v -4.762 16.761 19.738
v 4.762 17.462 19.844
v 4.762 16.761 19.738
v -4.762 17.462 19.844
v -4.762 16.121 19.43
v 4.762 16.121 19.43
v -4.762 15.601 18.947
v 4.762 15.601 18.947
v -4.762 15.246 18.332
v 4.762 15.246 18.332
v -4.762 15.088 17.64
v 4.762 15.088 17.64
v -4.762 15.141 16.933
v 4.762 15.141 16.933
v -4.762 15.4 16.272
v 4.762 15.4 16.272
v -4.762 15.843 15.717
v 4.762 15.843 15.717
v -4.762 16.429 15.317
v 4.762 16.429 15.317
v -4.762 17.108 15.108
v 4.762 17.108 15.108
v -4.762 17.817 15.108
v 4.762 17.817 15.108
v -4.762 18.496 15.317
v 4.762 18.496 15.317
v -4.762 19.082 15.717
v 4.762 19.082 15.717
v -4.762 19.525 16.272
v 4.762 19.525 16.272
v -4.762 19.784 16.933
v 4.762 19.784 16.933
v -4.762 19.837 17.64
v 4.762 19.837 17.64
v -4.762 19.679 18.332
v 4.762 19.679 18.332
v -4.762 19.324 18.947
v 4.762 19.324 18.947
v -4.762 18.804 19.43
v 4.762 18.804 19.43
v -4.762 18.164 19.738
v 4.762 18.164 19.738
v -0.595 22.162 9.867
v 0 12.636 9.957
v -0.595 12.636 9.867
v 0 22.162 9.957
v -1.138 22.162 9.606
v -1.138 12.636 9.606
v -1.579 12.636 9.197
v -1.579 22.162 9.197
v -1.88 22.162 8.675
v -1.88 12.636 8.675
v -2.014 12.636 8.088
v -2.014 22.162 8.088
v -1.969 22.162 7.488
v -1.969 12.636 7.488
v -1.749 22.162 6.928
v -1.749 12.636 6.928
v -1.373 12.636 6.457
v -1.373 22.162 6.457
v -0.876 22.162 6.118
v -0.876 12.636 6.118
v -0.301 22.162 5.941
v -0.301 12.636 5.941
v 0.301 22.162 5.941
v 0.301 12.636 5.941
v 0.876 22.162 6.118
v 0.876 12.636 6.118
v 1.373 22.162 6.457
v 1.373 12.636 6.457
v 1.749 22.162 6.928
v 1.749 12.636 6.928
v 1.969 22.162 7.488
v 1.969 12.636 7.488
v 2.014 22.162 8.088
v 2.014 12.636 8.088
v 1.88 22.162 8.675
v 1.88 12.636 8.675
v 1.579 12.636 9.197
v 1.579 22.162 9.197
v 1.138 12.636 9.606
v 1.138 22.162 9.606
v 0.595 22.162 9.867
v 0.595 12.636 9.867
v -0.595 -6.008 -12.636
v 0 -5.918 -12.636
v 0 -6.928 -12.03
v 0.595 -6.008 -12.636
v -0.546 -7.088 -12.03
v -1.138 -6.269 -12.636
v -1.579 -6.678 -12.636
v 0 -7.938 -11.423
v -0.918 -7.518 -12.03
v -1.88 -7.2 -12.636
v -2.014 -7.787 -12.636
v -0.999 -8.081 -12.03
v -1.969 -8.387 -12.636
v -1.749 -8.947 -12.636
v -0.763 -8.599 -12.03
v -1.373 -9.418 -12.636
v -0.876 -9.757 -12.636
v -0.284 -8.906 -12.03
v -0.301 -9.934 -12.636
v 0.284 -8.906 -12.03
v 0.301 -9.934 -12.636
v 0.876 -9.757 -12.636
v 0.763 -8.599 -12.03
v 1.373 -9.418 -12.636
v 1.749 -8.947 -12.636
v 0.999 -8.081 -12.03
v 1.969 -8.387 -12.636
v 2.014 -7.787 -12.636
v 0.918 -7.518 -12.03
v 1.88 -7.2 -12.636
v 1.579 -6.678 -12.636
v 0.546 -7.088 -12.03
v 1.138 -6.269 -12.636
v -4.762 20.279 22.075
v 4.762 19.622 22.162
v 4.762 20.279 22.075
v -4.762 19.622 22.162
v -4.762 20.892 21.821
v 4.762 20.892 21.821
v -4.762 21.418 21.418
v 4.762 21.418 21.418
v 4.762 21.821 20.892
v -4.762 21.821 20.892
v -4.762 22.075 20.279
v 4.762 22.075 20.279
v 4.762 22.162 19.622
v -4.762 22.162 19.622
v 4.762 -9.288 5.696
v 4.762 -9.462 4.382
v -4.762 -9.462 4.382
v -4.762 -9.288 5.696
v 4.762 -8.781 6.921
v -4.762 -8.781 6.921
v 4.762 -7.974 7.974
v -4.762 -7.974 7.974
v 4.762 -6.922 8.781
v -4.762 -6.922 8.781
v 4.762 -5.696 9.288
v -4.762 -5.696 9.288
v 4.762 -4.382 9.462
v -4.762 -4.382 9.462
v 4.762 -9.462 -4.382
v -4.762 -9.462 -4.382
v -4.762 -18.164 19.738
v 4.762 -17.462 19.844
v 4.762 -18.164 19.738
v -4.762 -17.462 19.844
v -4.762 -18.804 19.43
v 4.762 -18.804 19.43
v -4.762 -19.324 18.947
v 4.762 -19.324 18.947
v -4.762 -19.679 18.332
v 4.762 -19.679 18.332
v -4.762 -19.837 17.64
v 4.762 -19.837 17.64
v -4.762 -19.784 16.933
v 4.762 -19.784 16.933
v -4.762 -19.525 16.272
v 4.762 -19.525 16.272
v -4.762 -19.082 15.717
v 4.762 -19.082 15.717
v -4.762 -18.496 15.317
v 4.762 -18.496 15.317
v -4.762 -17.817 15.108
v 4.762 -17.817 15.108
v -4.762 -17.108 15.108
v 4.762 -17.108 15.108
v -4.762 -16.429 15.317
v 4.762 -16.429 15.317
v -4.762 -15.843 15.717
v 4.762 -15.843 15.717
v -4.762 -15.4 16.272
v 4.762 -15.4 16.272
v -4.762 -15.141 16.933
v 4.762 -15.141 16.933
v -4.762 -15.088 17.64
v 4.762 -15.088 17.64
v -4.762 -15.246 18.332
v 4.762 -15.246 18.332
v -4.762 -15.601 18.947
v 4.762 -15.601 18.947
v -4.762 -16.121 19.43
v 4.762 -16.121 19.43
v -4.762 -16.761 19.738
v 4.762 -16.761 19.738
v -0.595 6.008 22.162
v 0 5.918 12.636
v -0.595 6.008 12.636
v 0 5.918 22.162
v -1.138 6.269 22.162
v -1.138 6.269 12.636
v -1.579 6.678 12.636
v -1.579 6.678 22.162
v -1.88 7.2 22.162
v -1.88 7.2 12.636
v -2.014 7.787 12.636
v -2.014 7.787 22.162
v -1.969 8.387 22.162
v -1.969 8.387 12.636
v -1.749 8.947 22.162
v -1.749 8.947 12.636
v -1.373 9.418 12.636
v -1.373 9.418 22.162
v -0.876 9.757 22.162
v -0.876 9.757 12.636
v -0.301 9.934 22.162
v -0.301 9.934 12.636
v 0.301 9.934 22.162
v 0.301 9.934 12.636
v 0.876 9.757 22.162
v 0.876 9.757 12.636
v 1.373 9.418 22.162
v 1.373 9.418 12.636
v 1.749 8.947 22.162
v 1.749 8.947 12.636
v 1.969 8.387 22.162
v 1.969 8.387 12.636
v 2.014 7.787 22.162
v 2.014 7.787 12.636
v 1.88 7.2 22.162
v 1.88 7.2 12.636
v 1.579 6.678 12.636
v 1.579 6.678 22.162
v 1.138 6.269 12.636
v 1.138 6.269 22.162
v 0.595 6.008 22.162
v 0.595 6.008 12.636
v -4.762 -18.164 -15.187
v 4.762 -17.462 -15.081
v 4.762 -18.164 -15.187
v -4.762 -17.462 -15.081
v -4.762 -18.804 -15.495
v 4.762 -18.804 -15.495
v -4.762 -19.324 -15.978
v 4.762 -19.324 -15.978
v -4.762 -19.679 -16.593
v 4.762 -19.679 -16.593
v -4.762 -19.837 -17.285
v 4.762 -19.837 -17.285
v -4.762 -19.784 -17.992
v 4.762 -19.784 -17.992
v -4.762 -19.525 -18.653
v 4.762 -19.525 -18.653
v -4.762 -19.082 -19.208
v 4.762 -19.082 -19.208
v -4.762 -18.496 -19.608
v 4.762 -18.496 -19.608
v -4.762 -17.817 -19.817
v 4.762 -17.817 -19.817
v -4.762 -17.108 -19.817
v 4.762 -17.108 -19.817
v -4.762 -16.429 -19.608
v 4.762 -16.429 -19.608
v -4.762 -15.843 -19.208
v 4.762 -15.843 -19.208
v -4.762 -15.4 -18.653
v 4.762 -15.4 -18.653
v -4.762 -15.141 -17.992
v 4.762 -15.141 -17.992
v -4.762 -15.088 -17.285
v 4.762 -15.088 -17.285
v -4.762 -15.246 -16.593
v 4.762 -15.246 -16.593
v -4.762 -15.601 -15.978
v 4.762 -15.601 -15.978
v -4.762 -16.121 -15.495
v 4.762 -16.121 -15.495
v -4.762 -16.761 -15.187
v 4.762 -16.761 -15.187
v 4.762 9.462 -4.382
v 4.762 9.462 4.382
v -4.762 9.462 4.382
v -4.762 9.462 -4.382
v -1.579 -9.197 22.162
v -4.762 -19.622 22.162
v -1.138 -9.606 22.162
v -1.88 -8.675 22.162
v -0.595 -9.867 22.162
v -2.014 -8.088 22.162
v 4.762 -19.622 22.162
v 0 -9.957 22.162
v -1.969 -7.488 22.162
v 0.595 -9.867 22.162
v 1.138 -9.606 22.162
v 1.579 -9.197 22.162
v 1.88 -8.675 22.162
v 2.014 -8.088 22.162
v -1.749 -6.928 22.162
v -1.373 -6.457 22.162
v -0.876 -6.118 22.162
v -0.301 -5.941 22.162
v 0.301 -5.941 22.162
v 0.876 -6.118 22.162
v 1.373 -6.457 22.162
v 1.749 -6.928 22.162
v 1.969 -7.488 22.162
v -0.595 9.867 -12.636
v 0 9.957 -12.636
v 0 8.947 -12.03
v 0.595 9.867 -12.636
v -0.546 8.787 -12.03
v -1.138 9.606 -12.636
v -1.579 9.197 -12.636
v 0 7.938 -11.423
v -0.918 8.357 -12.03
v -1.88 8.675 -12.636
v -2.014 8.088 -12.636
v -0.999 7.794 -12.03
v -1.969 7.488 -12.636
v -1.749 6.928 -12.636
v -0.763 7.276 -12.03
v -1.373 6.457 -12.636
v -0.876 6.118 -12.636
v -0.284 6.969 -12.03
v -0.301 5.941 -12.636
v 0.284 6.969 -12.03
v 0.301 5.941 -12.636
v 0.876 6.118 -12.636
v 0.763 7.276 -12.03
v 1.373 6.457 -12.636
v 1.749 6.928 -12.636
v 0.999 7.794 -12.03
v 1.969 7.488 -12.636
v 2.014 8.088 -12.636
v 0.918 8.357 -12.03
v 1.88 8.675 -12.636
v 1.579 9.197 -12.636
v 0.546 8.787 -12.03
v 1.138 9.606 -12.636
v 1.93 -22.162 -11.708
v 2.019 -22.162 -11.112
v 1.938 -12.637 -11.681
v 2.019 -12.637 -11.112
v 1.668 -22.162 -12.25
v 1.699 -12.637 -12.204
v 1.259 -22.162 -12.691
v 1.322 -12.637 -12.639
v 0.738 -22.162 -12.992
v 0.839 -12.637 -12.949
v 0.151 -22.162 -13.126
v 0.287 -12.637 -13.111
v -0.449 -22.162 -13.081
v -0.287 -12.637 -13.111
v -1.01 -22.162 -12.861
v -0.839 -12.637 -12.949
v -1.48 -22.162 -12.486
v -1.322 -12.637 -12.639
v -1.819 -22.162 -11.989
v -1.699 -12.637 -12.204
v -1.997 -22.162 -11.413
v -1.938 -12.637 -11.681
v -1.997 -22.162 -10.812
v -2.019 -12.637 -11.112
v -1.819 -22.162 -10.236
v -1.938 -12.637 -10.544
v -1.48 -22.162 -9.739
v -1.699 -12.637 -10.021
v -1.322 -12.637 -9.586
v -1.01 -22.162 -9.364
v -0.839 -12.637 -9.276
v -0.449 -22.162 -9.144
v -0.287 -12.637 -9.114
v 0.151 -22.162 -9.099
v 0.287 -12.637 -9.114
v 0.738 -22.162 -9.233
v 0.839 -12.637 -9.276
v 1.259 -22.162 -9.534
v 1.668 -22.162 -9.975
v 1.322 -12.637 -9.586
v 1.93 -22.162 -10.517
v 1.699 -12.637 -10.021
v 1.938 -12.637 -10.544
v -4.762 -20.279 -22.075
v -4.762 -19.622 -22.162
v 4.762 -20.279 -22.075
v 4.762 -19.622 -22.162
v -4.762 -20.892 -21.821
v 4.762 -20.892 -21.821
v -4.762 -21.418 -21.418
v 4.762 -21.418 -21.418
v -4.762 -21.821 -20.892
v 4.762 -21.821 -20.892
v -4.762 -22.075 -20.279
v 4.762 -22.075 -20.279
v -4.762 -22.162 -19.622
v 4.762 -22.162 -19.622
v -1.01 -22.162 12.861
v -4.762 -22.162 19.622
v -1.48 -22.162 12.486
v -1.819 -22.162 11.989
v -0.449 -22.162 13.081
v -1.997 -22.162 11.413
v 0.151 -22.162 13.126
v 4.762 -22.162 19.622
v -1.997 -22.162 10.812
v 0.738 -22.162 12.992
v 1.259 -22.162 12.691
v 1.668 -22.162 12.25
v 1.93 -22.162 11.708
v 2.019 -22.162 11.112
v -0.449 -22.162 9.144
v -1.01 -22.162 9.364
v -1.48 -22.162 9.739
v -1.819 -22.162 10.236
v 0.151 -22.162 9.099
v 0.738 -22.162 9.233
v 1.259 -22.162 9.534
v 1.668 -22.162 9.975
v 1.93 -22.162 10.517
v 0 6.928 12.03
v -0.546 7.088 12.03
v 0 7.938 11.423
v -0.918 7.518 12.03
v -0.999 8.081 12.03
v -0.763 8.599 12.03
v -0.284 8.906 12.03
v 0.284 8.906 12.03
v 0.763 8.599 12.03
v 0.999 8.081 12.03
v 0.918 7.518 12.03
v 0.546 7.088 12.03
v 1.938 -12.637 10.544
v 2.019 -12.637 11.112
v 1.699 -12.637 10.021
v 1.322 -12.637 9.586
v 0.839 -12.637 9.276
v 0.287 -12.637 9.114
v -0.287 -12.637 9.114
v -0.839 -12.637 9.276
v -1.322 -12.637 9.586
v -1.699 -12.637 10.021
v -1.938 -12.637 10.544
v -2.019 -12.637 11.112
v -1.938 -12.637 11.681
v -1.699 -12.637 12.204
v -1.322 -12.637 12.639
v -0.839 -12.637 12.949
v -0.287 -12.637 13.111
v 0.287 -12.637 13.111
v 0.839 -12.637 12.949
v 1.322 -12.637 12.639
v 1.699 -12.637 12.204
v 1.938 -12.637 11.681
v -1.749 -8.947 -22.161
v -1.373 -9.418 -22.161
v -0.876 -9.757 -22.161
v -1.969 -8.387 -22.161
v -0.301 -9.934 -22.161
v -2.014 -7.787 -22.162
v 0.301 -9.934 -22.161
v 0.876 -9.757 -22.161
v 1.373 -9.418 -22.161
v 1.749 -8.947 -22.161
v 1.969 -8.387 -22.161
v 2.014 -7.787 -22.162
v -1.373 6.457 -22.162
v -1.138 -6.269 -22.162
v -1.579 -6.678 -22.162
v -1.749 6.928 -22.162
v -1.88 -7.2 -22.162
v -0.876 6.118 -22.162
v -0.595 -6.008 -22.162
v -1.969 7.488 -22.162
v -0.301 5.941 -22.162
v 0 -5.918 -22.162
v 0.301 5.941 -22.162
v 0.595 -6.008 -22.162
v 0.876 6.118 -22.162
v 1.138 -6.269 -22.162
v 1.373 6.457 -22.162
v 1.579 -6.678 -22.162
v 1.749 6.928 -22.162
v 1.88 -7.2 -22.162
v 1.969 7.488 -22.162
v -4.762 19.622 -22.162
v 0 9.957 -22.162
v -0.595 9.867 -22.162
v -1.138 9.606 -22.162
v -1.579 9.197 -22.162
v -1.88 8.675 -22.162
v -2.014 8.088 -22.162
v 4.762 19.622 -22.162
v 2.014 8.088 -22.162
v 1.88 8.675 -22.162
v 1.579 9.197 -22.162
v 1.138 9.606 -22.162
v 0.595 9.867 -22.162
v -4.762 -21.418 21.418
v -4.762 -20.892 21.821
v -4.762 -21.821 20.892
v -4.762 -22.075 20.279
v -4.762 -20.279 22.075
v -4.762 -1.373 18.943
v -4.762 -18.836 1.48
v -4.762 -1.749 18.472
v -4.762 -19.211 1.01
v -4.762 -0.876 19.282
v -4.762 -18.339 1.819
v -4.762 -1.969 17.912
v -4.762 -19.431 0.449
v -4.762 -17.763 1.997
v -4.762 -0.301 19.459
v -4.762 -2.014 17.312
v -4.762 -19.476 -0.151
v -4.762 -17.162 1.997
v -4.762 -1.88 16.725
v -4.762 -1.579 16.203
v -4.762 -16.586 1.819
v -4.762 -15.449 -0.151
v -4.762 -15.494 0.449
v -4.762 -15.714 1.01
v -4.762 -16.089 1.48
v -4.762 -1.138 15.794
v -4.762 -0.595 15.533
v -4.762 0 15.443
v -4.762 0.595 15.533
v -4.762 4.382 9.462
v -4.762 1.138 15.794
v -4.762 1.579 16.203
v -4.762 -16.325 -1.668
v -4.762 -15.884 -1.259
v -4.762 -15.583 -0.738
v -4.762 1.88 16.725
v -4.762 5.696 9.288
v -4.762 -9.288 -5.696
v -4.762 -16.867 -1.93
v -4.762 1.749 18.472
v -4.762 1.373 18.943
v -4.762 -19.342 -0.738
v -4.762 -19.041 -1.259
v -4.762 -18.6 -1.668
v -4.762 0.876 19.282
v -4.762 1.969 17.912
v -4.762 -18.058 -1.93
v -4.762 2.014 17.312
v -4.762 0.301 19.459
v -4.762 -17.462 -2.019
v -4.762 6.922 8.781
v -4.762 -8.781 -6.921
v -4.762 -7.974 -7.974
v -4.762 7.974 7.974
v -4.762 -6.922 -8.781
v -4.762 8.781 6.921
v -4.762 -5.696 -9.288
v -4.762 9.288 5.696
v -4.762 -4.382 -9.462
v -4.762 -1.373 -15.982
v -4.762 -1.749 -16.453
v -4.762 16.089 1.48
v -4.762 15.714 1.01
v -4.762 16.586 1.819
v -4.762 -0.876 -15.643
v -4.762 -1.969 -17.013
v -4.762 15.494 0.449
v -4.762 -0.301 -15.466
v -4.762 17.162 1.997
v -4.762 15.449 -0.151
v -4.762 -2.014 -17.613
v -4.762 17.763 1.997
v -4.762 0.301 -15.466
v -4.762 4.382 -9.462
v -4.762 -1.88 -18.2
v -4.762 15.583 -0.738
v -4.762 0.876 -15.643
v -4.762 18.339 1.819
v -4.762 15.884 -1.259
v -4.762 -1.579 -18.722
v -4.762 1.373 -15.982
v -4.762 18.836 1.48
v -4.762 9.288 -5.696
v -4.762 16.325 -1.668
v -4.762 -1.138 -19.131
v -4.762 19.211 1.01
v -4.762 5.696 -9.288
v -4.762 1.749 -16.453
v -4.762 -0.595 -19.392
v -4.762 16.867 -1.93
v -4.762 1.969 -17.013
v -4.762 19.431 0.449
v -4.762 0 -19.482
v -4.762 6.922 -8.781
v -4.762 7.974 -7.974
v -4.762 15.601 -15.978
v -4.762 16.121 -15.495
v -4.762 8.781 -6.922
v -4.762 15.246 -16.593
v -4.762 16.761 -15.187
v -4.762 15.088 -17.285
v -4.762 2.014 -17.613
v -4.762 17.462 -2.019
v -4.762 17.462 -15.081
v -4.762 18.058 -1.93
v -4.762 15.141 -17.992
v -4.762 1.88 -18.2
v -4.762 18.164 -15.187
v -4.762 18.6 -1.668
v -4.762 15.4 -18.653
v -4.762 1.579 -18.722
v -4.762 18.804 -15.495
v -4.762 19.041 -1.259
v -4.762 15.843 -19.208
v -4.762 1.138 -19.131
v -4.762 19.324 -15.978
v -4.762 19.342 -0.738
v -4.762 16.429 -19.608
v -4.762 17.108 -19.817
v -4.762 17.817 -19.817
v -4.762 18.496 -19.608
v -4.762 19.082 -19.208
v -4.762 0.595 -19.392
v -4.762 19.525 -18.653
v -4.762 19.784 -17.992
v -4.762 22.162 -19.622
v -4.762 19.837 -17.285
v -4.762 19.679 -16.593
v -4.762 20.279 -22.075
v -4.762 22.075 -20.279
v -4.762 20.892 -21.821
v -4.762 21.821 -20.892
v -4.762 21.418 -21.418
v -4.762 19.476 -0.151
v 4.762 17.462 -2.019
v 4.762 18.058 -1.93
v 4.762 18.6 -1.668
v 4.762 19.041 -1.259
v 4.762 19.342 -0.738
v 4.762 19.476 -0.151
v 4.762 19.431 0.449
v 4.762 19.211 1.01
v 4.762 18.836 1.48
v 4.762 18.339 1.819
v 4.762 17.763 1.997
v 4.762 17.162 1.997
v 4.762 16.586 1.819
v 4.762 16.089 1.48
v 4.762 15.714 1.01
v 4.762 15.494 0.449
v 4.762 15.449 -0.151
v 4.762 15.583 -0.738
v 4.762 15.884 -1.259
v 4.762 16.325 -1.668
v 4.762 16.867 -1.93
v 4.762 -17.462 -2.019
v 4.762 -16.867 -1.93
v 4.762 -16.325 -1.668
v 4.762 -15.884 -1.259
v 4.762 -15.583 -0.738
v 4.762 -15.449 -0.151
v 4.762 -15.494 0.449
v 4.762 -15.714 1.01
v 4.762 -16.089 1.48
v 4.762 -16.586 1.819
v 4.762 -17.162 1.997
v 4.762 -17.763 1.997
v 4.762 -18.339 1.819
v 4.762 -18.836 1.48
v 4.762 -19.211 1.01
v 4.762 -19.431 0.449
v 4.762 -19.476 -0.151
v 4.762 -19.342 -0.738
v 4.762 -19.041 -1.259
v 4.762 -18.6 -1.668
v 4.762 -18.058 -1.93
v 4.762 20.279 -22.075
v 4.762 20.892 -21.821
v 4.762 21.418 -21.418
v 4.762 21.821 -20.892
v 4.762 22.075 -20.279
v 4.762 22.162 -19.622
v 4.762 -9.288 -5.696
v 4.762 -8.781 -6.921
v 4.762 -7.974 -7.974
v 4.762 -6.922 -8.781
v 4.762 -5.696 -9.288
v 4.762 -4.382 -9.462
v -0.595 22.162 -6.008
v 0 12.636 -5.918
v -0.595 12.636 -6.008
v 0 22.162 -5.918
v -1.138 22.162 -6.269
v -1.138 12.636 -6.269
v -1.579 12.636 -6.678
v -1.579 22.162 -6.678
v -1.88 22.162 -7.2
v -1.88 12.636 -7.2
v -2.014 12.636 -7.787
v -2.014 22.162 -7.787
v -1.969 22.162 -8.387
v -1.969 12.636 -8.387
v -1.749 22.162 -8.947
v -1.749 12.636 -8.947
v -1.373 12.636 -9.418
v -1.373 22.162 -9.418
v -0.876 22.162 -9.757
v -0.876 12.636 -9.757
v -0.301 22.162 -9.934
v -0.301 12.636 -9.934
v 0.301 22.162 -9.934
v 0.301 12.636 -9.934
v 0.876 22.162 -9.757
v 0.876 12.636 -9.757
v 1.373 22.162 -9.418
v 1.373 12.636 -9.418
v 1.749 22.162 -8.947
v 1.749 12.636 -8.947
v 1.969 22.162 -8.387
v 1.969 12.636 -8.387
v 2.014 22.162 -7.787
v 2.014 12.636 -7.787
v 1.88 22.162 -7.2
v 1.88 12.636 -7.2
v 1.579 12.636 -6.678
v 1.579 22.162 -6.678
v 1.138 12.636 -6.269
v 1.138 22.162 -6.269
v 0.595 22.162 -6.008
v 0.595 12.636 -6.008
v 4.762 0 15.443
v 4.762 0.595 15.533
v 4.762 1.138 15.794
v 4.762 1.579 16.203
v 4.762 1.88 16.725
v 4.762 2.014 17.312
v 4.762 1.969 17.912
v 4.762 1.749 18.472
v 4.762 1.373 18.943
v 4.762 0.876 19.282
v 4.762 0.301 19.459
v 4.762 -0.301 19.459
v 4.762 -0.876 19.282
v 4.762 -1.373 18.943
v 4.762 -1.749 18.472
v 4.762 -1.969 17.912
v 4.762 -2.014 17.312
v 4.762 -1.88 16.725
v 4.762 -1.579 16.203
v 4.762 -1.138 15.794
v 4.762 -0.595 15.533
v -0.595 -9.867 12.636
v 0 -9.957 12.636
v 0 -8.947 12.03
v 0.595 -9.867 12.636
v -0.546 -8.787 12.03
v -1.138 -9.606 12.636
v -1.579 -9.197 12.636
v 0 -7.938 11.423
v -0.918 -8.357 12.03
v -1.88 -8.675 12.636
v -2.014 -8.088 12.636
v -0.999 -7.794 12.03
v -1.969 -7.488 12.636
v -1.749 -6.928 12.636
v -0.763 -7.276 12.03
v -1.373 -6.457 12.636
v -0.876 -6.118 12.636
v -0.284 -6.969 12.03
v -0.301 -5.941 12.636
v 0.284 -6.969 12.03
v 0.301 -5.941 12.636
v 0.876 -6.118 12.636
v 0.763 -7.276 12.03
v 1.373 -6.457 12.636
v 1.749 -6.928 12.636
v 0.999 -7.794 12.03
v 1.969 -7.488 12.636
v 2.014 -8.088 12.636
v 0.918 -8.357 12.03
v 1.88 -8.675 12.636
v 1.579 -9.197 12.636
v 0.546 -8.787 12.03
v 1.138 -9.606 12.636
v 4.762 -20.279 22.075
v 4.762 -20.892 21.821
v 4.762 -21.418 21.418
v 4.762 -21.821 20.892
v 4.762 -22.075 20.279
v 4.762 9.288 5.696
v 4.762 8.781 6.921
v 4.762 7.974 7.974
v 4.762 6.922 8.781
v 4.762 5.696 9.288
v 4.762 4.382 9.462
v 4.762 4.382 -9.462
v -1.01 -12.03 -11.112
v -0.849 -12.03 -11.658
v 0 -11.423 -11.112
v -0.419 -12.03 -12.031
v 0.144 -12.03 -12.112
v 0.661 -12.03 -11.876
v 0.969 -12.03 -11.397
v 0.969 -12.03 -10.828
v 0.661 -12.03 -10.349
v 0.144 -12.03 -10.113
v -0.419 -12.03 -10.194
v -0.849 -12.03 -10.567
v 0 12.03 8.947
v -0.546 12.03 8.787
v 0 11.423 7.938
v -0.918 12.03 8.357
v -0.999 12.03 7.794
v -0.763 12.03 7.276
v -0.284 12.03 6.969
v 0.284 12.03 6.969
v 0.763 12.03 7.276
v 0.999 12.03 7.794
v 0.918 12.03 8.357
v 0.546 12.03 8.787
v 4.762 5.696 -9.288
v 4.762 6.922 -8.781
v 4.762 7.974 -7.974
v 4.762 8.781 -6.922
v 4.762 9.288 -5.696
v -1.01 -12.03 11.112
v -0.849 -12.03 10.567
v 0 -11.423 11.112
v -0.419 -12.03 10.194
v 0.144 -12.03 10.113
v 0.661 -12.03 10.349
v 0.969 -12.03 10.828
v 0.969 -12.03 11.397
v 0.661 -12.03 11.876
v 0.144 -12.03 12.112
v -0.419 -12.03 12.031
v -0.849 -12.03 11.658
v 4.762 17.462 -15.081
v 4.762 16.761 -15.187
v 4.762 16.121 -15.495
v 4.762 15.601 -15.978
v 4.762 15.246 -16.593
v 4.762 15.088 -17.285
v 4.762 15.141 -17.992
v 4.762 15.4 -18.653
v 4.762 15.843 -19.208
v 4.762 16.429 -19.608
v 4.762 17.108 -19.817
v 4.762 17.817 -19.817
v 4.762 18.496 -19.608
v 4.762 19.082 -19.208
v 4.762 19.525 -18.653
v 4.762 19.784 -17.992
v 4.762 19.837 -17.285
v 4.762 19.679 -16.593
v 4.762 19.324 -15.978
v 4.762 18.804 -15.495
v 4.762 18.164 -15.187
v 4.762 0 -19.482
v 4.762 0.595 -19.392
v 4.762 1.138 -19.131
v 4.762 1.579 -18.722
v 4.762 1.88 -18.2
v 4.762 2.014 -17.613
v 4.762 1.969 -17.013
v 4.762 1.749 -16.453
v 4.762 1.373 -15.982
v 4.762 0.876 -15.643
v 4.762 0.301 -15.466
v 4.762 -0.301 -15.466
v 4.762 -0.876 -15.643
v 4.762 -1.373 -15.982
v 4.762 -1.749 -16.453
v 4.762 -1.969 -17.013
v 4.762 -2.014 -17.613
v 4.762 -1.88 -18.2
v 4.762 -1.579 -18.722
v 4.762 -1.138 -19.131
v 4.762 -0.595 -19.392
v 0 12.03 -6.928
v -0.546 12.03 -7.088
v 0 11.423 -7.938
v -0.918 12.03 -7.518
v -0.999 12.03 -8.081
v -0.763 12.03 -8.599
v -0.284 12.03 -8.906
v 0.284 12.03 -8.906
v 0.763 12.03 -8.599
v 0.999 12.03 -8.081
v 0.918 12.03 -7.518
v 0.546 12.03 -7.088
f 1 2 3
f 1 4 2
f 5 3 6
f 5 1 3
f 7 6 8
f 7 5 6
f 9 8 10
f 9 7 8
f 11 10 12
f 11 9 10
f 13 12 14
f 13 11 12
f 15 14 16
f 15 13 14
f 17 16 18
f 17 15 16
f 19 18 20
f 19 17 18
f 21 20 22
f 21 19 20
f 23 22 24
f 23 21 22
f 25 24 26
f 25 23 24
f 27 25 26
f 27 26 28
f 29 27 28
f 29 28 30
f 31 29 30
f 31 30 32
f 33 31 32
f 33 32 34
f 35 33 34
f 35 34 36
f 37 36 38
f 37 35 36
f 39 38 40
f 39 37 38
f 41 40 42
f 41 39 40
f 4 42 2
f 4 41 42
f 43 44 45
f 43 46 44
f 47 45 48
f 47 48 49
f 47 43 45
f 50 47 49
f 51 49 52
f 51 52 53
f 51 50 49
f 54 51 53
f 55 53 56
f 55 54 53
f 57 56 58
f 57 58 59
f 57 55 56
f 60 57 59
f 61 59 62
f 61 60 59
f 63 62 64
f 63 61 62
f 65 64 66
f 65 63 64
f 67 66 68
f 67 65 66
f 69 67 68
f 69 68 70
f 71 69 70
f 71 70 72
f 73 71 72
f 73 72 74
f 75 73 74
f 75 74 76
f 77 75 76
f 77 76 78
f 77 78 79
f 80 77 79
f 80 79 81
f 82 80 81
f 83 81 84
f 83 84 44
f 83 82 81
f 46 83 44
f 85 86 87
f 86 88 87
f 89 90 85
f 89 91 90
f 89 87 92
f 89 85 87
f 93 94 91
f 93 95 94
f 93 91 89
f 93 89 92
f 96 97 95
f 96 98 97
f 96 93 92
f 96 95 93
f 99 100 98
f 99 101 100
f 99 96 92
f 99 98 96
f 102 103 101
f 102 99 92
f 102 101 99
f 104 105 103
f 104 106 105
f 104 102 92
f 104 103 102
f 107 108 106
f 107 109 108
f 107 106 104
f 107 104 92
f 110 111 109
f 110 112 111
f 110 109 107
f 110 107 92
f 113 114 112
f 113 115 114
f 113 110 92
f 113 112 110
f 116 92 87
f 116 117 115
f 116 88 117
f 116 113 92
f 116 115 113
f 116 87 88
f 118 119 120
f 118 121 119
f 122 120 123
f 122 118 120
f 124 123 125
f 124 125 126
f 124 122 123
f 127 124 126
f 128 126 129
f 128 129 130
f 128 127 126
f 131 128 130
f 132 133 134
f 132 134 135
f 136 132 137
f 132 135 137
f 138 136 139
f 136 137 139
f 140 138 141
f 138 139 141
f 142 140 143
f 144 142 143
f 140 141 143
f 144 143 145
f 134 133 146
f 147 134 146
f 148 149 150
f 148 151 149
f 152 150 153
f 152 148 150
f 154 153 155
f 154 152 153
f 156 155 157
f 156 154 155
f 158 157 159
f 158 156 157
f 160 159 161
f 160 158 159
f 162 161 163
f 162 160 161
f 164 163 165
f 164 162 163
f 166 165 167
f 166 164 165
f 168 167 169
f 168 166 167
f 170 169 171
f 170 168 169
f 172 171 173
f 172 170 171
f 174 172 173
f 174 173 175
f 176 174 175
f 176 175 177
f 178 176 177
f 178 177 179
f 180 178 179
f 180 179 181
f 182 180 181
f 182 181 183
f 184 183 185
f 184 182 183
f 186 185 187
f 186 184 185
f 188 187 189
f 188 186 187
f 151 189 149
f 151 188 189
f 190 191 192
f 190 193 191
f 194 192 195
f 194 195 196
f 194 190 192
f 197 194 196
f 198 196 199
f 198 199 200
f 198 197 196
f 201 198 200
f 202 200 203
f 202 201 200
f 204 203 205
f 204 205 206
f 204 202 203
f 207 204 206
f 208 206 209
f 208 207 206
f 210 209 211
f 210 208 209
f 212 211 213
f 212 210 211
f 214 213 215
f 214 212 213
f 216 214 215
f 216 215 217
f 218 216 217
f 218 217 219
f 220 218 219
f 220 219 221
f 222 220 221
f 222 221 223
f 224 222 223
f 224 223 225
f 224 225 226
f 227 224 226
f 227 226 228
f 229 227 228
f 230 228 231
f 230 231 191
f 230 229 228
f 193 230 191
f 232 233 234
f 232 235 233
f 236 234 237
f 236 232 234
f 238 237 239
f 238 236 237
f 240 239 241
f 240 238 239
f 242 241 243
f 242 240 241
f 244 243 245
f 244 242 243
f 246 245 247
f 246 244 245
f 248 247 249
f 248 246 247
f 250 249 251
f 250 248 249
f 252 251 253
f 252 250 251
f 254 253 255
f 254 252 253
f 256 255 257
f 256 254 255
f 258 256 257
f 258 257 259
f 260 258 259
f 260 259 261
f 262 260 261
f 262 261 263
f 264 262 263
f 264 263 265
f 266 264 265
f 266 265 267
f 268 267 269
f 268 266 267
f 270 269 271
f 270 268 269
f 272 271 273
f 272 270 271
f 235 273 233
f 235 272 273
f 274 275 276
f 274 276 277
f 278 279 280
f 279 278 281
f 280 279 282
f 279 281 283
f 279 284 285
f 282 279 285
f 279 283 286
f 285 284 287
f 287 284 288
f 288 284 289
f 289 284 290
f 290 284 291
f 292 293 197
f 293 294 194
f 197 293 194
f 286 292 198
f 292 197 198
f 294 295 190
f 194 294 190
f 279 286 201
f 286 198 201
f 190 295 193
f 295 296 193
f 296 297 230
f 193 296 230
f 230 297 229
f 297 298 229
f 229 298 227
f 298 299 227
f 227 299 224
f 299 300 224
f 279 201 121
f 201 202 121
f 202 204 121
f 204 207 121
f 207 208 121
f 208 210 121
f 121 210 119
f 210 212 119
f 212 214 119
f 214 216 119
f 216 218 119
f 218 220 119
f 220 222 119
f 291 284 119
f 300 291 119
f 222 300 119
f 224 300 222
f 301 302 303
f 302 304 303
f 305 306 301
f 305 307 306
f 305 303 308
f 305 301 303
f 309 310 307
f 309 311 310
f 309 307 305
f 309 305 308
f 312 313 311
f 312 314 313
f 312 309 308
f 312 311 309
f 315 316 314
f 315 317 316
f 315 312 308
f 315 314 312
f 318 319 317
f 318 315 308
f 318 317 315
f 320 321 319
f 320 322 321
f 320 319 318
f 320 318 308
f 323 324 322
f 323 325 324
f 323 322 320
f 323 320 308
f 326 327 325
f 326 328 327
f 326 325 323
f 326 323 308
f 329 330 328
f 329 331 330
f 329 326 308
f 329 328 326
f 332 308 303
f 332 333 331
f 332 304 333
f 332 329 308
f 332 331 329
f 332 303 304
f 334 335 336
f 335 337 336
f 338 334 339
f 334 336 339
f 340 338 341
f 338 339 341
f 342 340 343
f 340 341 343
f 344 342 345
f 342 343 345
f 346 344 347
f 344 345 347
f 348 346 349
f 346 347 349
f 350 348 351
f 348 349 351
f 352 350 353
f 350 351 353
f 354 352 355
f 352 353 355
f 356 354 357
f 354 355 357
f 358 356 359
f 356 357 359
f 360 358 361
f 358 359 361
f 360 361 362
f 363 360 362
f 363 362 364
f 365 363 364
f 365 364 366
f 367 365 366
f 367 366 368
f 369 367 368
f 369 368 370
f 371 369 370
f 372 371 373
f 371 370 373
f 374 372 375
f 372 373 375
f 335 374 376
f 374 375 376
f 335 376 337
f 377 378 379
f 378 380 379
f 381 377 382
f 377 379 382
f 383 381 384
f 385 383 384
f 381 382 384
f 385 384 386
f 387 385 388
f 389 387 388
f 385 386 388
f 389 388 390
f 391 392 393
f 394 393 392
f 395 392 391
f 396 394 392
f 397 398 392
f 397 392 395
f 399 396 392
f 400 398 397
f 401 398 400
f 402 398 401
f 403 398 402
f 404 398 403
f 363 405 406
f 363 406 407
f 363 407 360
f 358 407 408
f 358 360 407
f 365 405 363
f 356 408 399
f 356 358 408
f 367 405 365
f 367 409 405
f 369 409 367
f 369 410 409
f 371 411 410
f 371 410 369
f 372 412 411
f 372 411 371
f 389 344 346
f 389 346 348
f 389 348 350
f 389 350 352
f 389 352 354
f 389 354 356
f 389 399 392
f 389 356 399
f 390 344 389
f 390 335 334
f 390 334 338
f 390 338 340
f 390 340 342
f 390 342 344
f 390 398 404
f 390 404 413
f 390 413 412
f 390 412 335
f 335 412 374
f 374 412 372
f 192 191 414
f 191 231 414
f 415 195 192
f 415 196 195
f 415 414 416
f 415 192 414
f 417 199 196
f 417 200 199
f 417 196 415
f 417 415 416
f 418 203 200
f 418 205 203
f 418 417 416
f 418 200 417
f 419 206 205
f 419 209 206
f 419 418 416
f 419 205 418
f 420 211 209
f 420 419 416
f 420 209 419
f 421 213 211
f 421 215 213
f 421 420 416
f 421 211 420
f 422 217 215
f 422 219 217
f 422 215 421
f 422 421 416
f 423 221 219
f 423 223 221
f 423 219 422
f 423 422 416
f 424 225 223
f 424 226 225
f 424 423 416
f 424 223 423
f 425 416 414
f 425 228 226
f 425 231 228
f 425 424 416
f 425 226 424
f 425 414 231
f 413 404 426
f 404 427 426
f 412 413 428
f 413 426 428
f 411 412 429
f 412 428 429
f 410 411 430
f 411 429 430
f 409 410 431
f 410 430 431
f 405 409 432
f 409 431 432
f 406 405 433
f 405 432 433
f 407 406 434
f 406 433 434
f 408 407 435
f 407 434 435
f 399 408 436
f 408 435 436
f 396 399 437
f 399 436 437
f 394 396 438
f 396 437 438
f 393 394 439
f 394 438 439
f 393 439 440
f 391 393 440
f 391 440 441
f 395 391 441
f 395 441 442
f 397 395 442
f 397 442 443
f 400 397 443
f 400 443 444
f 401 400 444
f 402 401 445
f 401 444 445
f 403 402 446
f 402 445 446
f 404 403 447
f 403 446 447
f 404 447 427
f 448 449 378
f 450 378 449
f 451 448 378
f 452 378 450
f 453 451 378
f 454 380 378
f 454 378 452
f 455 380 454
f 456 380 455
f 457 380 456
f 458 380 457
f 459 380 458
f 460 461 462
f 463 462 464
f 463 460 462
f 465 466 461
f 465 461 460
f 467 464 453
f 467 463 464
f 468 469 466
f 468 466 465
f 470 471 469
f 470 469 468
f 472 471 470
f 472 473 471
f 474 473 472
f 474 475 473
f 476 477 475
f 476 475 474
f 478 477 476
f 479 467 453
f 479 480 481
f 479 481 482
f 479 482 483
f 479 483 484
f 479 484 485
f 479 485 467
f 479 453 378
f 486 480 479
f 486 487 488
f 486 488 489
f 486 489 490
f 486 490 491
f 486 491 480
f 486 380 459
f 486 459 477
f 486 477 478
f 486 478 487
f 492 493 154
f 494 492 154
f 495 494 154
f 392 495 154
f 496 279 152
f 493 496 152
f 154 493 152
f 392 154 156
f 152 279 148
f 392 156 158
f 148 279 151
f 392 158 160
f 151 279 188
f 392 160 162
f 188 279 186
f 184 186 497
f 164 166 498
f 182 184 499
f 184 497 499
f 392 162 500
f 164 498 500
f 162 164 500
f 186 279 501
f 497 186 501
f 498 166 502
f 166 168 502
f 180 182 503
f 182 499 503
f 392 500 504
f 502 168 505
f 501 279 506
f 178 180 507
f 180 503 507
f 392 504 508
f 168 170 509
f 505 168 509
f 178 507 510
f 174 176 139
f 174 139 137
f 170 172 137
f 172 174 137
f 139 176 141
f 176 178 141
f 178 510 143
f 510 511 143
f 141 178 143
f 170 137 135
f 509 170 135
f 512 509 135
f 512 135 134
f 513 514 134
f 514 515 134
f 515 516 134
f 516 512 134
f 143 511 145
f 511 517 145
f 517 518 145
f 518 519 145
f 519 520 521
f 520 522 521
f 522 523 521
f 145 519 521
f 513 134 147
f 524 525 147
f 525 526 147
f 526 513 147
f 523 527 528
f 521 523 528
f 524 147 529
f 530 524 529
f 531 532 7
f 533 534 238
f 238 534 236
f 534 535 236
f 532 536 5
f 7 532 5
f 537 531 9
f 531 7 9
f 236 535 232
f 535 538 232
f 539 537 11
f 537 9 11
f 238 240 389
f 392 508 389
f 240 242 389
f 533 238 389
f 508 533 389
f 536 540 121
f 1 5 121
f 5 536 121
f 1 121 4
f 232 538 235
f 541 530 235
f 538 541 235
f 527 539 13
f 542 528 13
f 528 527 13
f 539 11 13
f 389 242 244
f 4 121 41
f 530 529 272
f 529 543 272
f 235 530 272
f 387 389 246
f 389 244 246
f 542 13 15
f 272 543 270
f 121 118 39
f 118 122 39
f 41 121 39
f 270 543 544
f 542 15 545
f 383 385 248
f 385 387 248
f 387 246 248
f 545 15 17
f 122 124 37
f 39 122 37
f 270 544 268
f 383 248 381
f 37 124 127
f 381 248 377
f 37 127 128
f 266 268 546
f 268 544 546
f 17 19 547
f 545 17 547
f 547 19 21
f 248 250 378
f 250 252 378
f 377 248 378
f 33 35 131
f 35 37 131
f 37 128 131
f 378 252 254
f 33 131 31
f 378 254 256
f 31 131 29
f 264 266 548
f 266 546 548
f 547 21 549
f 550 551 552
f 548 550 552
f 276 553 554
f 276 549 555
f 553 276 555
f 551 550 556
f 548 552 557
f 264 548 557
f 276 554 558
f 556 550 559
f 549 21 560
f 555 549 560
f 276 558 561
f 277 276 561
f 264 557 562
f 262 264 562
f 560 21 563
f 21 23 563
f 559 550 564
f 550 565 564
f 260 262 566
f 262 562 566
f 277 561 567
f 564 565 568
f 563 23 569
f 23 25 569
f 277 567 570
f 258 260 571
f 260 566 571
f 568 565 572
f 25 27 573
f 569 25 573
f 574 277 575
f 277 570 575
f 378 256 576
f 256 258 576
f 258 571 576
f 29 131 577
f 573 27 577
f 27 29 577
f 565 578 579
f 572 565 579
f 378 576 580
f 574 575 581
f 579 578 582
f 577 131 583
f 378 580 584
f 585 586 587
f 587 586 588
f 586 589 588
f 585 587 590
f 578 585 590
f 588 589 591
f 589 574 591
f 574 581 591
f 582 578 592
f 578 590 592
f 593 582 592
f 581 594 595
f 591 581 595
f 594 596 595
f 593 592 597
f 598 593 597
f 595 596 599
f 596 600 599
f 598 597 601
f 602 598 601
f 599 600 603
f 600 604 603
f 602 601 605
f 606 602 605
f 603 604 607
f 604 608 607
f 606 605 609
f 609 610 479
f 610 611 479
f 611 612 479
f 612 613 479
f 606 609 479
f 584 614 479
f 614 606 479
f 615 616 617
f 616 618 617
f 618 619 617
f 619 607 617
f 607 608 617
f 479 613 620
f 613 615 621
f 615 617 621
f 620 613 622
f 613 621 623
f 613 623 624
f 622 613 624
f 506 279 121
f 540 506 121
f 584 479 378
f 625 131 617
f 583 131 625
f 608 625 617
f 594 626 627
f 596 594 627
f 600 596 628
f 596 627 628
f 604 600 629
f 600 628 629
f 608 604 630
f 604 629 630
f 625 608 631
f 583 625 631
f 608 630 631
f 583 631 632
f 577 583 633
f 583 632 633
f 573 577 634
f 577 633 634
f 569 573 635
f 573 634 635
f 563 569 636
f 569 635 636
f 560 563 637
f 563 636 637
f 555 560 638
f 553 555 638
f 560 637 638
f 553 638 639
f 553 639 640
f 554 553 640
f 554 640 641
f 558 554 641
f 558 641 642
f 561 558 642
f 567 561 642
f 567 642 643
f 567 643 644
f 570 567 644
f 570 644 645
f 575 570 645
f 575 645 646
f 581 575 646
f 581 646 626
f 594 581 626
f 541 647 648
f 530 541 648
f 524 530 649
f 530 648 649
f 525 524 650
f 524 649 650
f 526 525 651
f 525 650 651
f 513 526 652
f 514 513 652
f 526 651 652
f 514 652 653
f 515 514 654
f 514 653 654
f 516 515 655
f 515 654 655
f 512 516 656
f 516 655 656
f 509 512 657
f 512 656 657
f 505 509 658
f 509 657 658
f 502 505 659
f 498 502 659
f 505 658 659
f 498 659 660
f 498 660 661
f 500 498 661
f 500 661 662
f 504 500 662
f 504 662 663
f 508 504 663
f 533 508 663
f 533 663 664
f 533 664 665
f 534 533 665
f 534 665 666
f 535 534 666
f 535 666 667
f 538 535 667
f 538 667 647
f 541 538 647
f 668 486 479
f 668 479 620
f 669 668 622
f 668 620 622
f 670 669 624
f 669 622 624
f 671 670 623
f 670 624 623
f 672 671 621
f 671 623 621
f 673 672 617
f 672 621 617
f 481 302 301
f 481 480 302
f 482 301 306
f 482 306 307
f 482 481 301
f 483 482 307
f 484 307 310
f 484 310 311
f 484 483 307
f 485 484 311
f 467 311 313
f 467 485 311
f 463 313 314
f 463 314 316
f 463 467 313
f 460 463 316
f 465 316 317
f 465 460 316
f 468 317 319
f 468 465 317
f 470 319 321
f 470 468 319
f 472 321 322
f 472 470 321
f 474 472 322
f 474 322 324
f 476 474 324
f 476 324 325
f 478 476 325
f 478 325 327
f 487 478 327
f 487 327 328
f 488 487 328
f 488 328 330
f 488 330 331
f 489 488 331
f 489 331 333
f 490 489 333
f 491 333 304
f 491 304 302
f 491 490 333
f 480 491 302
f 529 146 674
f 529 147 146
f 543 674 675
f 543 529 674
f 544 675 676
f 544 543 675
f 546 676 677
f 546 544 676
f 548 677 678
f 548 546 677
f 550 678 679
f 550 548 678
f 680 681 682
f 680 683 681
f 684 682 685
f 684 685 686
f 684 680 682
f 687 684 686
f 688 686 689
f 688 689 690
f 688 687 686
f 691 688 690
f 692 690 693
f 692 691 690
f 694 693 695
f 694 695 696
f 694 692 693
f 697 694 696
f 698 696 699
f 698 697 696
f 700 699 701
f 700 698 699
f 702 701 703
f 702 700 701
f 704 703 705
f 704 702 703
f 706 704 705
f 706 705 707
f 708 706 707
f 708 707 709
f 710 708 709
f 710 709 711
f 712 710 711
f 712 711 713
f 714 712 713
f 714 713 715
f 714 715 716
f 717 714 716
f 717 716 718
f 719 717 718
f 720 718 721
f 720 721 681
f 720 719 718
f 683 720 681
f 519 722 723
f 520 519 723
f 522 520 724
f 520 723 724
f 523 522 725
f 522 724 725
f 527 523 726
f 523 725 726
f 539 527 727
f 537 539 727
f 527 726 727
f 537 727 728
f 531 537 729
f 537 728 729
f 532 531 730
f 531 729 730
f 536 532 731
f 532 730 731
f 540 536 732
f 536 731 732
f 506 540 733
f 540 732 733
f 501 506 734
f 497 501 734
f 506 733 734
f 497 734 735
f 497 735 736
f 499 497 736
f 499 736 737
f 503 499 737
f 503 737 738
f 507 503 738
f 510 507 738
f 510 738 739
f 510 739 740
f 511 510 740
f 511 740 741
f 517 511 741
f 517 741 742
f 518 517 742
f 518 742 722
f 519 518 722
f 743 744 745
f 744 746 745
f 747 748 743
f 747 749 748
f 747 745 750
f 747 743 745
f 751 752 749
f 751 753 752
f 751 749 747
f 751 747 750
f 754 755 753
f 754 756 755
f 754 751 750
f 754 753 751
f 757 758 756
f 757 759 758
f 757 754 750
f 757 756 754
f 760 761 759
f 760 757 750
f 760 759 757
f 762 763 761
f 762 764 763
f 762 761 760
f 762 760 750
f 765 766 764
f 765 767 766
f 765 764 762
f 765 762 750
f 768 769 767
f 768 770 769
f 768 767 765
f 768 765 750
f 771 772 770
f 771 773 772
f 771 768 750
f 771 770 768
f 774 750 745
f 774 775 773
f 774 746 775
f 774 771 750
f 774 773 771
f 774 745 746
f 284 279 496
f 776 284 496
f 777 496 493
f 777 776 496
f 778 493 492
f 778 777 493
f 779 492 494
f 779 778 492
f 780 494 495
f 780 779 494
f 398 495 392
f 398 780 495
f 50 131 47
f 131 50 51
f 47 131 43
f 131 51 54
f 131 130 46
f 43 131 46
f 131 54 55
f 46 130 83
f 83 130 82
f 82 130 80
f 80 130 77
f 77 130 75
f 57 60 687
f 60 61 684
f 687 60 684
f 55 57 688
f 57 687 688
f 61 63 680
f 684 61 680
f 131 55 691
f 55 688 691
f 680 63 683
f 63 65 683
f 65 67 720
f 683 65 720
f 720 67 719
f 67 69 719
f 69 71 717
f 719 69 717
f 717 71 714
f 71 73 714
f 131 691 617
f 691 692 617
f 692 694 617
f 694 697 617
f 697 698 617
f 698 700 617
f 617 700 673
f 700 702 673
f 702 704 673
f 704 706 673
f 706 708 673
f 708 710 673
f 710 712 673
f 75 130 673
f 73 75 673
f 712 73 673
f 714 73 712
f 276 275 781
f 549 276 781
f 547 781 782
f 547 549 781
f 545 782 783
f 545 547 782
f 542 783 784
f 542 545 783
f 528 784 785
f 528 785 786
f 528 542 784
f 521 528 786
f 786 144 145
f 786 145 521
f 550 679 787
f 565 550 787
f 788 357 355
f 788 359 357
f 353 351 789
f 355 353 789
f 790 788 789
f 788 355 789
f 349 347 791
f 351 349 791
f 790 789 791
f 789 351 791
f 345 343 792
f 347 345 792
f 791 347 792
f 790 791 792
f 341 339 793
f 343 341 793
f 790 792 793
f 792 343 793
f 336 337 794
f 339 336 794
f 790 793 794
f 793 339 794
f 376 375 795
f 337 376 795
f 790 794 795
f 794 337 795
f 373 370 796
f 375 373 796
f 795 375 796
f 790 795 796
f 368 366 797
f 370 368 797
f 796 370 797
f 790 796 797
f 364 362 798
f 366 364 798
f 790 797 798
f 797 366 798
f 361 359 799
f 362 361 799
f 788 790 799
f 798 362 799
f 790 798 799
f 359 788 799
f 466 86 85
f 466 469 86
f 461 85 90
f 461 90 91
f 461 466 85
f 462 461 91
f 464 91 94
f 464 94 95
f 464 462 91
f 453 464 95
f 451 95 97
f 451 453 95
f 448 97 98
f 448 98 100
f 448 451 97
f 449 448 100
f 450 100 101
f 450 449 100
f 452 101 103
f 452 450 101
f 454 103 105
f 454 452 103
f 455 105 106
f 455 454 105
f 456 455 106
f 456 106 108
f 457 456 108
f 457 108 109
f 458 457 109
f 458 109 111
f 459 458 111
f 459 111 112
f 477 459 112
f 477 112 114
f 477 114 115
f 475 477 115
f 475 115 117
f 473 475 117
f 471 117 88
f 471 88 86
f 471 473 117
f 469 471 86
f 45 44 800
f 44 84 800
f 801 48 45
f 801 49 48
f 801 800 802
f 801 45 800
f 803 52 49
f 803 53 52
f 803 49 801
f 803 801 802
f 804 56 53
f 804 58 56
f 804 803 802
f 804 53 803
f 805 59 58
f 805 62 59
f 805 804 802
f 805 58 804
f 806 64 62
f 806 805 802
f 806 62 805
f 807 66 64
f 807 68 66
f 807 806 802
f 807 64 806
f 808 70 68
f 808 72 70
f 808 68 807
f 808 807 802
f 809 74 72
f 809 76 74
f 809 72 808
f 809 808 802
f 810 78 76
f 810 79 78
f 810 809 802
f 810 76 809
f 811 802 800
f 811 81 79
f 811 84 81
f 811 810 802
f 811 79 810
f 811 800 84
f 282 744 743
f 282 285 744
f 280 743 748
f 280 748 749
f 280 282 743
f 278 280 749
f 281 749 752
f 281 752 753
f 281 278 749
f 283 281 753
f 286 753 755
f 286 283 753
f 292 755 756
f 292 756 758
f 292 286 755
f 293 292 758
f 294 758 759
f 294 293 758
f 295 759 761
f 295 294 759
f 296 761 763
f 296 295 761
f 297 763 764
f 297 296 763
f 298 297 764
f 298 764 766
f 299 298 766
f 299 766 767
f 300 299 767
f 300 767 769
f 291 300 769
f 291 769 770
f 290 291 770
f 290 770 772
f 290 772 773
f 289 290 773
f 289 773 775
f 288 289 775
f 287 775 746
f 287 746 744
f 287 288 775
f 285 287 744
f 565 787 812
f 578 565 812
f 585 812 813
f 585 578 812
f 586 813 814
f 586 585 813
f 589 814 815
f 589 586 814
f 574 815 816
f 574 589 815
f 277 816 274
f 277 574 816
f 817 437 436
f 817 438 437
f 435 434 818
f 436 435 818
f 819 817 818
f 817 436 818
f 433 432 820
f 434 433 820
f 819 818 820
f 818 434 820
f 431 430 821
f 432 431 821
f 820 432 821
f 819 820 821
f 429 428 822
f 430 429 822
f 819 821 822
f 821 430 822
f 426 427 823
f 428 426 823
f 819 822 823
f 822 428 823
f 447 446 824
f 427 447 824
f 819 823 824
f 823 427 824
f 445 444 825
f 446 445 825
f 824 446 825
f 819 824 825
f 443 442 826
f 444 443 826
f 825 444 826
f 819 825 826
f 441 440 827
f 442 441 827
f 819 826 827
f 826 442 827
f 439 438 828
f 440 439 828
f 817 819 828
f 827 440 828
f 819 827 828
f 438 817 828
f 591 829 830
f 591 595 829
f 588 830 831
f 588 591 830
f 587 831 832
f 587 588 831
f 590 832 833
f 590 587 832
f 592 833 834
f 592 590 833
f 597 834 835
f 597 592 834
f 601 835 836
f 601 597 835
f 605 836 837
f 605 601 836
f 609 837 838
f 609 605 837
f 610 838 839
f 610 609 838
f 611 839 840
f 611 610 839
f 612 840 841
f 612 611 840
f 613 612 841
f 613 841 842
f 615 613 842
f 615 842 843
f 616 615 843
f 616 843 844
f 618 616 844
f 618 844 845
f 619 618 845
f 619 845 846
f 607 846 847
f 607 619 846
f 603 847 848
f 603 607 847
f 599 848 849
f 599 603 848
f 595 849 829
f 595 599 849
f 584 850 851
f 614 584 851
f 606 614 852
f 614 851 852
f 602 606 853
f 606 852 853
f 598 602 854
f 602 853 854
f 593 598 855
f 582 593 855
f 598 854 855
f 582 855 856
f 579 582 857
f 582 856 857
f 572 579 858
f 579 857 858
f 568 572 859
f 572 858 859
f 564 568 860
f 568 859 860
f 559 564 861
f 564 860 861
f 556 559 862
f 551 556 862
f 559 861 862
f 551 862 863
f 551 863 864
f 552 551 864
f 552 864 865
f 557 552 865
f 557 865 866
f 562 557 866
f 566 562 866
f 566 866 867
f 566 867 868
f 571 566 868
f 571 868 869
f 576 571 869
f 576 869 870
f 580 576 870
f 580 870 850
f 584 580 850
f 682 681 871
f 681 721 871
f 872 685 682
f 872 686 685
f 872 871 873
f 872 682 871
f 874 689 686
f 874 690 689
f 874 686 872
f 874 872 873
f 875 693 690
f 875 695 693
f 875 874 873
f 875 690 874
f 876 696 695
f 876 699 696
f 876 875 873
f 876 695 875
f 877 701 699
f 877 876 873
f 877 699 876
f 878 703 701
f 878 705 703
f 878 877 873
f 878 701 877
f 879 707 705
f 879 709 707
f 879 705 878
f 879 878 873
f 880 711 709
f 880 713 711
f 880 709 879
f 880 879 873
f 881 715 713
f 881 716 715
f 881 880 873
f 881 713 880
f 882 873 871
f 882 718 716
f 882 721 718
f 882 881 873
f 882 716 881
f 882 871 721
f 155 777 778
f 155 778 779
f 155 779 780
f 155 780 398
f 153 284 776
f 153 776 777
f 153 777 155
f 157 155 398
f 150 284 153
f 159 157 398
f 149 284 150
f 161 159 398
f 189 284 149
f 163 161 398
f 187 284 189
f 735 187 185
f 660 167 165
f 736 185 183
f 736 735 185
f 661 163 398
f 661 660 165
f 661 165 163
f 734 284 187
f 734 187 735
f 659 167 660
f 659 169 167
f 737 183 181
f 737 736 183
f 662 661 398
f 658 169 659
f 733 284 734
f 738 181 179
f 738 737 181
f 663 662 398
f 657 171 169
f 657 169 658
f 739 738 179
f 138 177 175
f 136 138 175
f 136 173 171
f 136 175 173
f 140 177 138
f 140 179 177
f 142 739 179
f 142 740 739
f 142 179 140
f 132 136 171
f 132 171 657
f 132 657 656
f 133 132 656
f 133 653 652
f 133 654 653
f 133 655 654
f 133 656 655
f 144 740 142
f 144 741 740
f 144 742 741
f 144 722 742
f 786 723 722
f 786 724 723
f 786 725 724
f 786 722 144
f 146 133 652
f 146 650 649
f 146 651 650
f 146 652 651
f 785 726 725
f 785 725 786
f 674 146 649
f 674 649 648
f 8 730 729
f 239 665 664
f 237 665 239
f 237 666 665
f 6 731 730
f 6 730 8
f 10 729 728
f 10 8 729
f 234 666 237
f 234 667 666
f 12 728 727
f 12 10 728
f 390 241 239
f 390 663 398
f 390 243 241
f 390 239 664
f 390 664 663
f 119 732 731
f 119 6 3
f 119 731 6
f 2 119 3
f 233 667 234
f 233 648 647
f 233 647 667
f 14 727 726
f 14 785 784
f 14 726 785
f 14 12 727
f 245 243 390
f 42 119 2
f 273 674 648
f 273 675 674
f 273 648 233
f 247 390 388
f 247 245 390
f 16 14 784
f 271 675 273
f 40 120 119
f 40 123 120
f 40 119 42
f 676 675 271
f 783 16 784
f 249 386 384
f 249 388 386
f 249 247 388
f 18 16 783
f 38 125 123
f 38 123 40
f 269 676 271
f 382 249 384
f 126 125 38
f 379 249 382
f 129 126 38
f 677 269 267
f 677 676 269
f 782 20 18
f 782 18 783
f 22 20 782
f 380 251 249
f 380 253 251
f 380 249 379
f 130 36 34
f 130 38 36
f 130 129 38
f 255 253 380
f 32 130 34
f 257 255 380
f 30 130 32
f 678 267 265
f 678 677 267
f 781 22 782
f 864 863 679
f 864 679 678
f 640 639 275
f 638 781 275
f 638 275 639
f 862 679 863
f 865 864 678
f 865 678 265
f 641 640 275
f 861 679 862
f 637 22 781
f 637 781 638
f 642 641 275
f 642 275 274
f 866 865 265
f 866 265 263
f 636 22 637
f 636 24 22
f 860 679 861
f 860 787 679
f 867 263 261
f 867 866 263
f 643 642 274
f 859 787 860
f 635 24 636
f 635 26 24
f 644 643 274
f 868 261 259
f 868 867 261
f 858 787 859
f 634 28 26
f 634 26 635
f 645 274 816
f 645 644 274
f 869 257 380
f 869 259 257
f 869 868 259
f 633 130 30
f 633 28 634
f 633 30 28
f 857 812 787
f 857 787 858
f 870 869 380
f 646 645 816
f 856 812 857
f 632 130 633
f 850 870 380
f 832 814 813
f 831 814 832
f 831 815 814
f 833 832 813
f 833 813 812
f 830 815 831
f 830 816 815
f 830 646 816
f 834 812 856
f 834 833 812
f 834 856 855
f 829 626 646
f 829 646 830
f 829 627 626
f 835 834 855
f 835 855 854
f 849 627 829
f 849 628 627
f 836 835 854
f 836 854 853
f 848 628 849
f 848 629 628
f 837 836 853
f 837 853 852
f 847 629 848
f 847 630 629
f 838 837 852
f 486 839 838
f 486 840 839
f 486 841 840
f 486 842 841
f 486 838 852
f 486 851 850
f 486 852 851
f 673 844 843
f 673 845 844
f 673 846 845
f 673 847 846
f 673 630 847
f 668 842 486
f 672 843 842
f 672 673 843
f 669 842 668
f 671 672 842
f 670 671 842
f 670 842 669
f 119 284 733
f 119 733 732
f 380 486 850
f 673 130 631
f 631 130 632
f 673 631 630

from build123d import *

# Parameters (mm, degrees)
SKETCH1_W                       = 44.323
SKETCH1_H                       = 44.323
SKETCH1_R                       = 2.38125
BOSS_EXTRUDE1_DEPTH             = 4.7625
FILLET1_R                       = 2.54
F_10_32_TAPPED_HOLE1_D          = 4.0386
F_10_32_TAPPED_HOLE1_DEPTH      = 12.0396
F_10_32_TAPPED_HOLE1_TIP        = 1.213317848
F_10_32_TAPPED_HOLE2_AT_2_COUNT = 2
F_10_32_TAPPED_HOLE2_AT_2_PITCH = 15.875
CIRPATTERN1_COUNT               = 4
F_10_32_TAPPED_HOLE3_D          = 4.0386
F_10_32_TAPPED_HOLE3_DEPTH      = 9.525
F_10_32_TAPPED_HOLE3_TIP        = 1.213317848
SKETCH19_W                      = 18.923
SKETCH19_H                      = 18.923
CUT_EXTRUDE1_DEPTH              = 33.756522854
FILLET2_R                       = 5.08


with BuildPart() as part:
    # Sketch1 → Boss-Extrude1 (new, symmetric)
    with BuildSketch(Plane(origin=(0, 0, 0), x_dir=(0, 0, -1), z_dir=(1, 0, 0))):
        Rectangle(SKETCH1_W, SKETCH1_H)
        with Locations((-17.4625, 17.4625)):
            Circle(SKETCH1_R, mode=Mode.SUBTRACT)
        with Locations((17.4625, 17.4625)):
            Circle(SKETCH1_R, mode=Mode.SUBTRACT)
        with Locations((-17.4625, -17.4625)):
            Circle(SKETCH1_R, mode=Mode.SUBTRACT)
        with Locations((17.4625, -17.4625)):
            Circle(SKETCH1_R, mode=Mode.SUBTRACT)
    extrude(amount=BOSS_EXTRUDE1_DEPTH, both=True)

    # Fillet1
    fillet1_edges = [part.edges().sort_by_distance(p)[0] for p in [
        (0, -22.1615, -22.1615),
        (0, -22.1615, 22.1615),
        (0, 22.1615, 22.1615),
        (0, 22.1615, -22.1615),
    ]]
    fillet(fillet1_edges, radius=FILLET1_R)

    # #10-32 Tapped Hole1
    with Locations(Plane.ZY.offset(4.7625)):
        with Locations((0, -17.4625), (0, 17.4625), (-17.4625, 0), (17.4625, 0)):
            Hole(F_10_32_TAPPED_HOLE1_D / 2, depth=F_10_32_TAPPED_HOLE1_DEPTH)
            with Locations((0, 0, -(F_10_32_TAPPED_HOLE1_DEPTH + F_10_32_TAPPED_HOLE1_TIP / 2))):  # 118° drill point
                Cone(0, F_10_32_TAPPED_HOLE1_D / 2, F_10_32_TAPPED_HOLE1_TIP, mode=Mode.SUBTRACT)

    # Sketch15 → #10-32 Tapped Hole2 (revolve, cut)
    with BuildSketch(Plane(origin=(0, 22.1615, -7.9375), x_dir=(0, 0, 1), z_dir=(1, 0, 0))):
        Polygon((0, 0), (0, 10.738317848), (2.0193, 9.525), (2.0193, 0), align=None)
    f_10_32_tapped_hole2 = revolve(axis=Axis((0, 28.5115, -7.9375), (0, -1, 0)), mode=Mode.SUBTRACT)

    # #10-32 Tapped Hole2 at 2: #10-32 Tapped Hole2 ×2
    with Locations(*[(0, 0, i * F_10_32_TAPPED_HOLE2_AT_2_PITCH) for i in range(1, F_10_32_TAPPED_HOLE2_AT_2_COUNT)]):
        add(f_10_32_tapped_hole2, mode=Mode.SUBTRACT)

    # CirPattern1: #10-32 Tapped Hole2 ×4 about axis, 1 skipped
    cirpattern1_axis = Axis((0, 0, 0), (1, 0, 0))
    add([f_10_32_tapped_hole2.rotate(cirpattern1_axis, i * 360 / CIRPATTERN1_COUNT) for i in range(1, CIRPATTERN1_COUNT) if i not in (2,)], mode=Mode.SUBTRACT)

    # CirPattern1 copy 1 sketch → CirPattern1 copy 1 (revolve, cut)
    with BuildSketch(Plane(origin=(0, -7.9375, 22.1615), x_dir=(0, -1, 0), z_dir=(1, 0, 0))):
        Polygon((0, 0), (0, 10.738317848), (2.0193, 9.525), (2.0193, 0), align=None)
    revolve(axis=Axis((0, -7.9375, 28.5115), (0, 0, -1)), mode=Mode.SUBTRACT)

    # CirPattern1 copy 2 sketch → CirPattern1 copy 2 (revolve, cut)
    with BuildSketch(Plane(origin=(0, 7.9375, -22.1615), x_dir=(0, 1, 0), z_dir=(1, 0, 0))):
        Polygon((0, 0), (0, 10.738317848), (2.0193, 9.525), (2.0193, 0), align=None)
    revolve(axis=Axis((0, 7.9375, -28.5115), (0, 0, 1)), mode=Mode.SUBTRACT)

    # #10-32 Tapped Hole3
    with Locations(Plane(origin=(0, -22.1615, 0), x_dir=(-1, 0, 0), z_dir=(0, -1, 0))):
        with Locations((0, -11.1125), (0, 11.1125)):
            Hole(F_10_32_TAPPED_HOLE3_D / 2, depth=F_10_32_TAPPED_HOLE3_DEPTH)
            with Locations((0, 0, -(F_10_32_TAPPED_HOLE3_DEPTH + F_10_32_TAPPED_HOLE3_TIP / 2))):  # 118° drill point
                Cone(0, F_10_32_TAPPED_HOLE3_D / 2, F_10_32_TAPPED_HOLE3_TIP, mode=Mode.SUBTRACT)

    # Sketch19 → Cut-Extrude1 (cut, through all)
    with BuildSketch(Plane(origin=(4.7625, 0, 0), x_dir=(0, 0, -1), z_dir=(1, 0, 0))):
        Rectangle(SKETCH19_W, SKETCH19_H)
    extrude(amount=-CUT_EXTRUDE1_DEPTH, mode=Mode.SUBTRACT)

    # Fillet2
    fillet2_edges = [part.edges().sort_by_distance(p)[0] for p in [
        (0, 9.4615, -9.4615),
        (0, -9.4615, -9.4615),
        (0, -9.4615, 9.4615),
        (0, 9.4615, 9.4615),
    ]]
    fillet(fillet2_edges, radius=FILLET2_R)


solid = part.part
